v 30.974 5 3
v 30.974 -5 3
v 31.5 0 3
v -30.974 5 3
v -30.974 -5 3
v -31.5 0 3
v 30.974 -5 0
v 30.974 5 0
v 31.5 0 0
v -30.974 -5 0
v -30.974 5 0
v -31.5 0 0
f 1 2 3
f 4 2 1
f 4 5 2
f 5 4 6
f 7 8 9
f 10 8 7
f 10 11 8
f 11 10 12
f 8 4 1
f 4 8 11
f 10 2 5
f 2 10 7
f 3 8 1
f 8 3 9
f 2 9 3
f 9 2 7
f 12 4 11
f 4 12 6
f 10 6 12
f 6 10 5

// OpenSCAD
/*-------------------------------------------------------------------------\
Tab n Slot module

Author: SimCity


A simple module to generate tabs and slots to make 2 objects interlock
Use slots(); with a difference to cut grooves
Use tab(); with a union to add tabs to the other object

just about everything I could think of is panametric, just watch that you don't set certain values to numbers that wouldn't work. Most of these are simple math to avoid.

To Do: currently generating 2 or more tabs cannont be compliled to look right but renders fine. Need to fix this to make life easier
Stops are not implemented so have to make own if groove protrude out the other side of the object
Need to add some error code to stop the use of values that will result in slots longer than possible and tabs that are too big for there to be enough room for grooves.
\----------------------------------------------------------------------------*/

// Display Tabs or Slots? (Note: Slots generates what is to be cut away)
part=1; //[1:Tabs,0:Slots]

//diameter of center hole which everything rotates around
center_hole=55;
//turn on or off removing material from the center hole (broken atm)
cut_hole=0; //[0:Disabled,1:Enabled]
//how far you want to go in before turning
insert_depth=10;
//how deep to cut the groove (In other terms ho much should the tabs stick out by)
groove_depth=4;
//Ho wide should the groove be (Or in other terms how thick to make the tabs)
groove_width=3; 
//width of tab (Good idea to not make this more than Radius)
tab_width=10; 
//how far to rotate to lock, never set to more than 360/Tab Number
rotation=25; 
//Number of tabs, don't recommend using 1 for physical use but is handy for testing things
tab_number=2; //[2:10]
//self explanetry really, this will be dependant on printer
tollerance=0.2;
//which way you want to rotate, set to 0 for anti-clockwise
direction=1; //[1:Clockwise,0:Counter-Clockwise]
//use this if the center_hole is larger than the object that will have the tabs to extend them
gap=10;
//this adds a little indent and nub at the final resting point to make it harder to turn back, adjust to a value that is not too big just enough to make it click into place. Takes a bit of fine tuning
lock=0; 
//Use if slots material is going to be thinner than groove thickness to add a stop to edge of tab. Untested
stop=0; //[0:Disabled,1:Enabled]

//enable to remove any material that is in the arc the tabs will rotate through, not needed if cut_hole is set true
tab_clearance=0; //[0:Disabled,1:Enabled]


//test tabs
if (part){
union(){
//cylinder(r=center_hole/2, h=insert_depth);
tabs();
}
}
else{
//test slots

difference(){
translate([0,0,insert_depth/2-5])
cube([center_hole+groove_depth*2+40,center_hole+groove_depth*2+40,insert_depth+10],center=true);
//cylinder(r=center_hole/2, h=insert_depth+15,center=true);
slots();
}
}    
  

//math, leave commented (its in the modules only noted here for reference)
//a=center_hole+2*groove_depth+10;
//b=center_hole/2+groove_depth;
//c=tab_width/2+tollerance;

module slots(

center_hole=center_hole,
cut_hole=cut_hole,
insert_depth=insert_depth,
groove_depth=groove_depth,
groove_width=groove_width,
tab_width=tab_width,
rotation=rotation,
tab_number=tab_number,
tollerance=tollerance,
direction=direction,
gap=gap,
lock=lock,
stop=stop,
tab_clearance=tab_clearance

){

a=center_hole+2*groove_depth+10;
b=center_hole/2+groove_depth;
c=tab_width/2+tollerance;

	union(){
		for(i = [0:tab_number]){
			rotate((360/tab_number)*i)
			union(){
				difference(){
					cylinder(r=b, h=insert_depth);
					rotate(-rotation*(direction))
					translate([-a/2,c,-5])
					cube([a,b,insert_depth+10]);
					rotate(rotation*(1-direction))
					translate([-a/2,-c-b-10,-5])
					cube([a,b+10,insert_depth+10]);
					if(tab_clearance){
						translate([0,0,groove_width+2*tollerance])
						difference(){
							cylinder(r=b+5, h=insert_depth);
							cylinder(r=center_hole/2, h=insert_depth+10,center=true);
							translate([-a/2,(2*+c*direction)-c-b-10,-5])
							cube([a,b+10,insert_depth+10]);
						}
					}else {
						translate([-a/2,(2*c*direction)-c,groove_width+2*tollerance])
						cube([a,b+10,insert_depth]);
					}
					rotate([0,90,rotation*(direction)+90])
					cylinder(r=lock, h=center_hole+groove_depth+10);
				}
			}
		}
		if (cut_hole)
		cylinder(r=center_hole/2, h=insert_depth);
	}
}


module tabs(

center_hole=center_hole,
insert_depth=insert_depth,
groove_depth=groove_depth,
groove_width=groove_width,
tab_width=tab_width,
tab_number=tab_number,
tollerance=tollerance,
direction=direction,
gap=gap,
lock=lock,
stop=stop

){

a=center_hole+2*groove_depth+10;
b=center_hole/2+groove_depth;
c=tab_width/2+tollerance;

	intersection(){
		cylinder(r=b, h=insert_depth);
		for(i = [0:tab_number]){
		rotate((360/tab_number)*i)
            
            difference(){
                union(){

                    translate([0,-tab_width/2,0])
                    cube([center_hole+groove_depth,tab_width,groove_width]);
                    if(stop){
                        translate([(center_hole+groove_depth)/2,(tab_width/2-(groove_width/4))*(direction?1:-1),groove_width])
                        cube([center_hole+groove_depth,groove_width/2,groove_width],center=true); 
                    }
                }
                rotate([0,90,0])
                cylinder(r=lock, h=center_hole+groove_depth+10);
                translate([0,0,-5])
                if (cut_hole)
                cylinder(r=(center_hole/2)-tollerance-gap, h=groove_width+10);
            }

		}
	}
}
